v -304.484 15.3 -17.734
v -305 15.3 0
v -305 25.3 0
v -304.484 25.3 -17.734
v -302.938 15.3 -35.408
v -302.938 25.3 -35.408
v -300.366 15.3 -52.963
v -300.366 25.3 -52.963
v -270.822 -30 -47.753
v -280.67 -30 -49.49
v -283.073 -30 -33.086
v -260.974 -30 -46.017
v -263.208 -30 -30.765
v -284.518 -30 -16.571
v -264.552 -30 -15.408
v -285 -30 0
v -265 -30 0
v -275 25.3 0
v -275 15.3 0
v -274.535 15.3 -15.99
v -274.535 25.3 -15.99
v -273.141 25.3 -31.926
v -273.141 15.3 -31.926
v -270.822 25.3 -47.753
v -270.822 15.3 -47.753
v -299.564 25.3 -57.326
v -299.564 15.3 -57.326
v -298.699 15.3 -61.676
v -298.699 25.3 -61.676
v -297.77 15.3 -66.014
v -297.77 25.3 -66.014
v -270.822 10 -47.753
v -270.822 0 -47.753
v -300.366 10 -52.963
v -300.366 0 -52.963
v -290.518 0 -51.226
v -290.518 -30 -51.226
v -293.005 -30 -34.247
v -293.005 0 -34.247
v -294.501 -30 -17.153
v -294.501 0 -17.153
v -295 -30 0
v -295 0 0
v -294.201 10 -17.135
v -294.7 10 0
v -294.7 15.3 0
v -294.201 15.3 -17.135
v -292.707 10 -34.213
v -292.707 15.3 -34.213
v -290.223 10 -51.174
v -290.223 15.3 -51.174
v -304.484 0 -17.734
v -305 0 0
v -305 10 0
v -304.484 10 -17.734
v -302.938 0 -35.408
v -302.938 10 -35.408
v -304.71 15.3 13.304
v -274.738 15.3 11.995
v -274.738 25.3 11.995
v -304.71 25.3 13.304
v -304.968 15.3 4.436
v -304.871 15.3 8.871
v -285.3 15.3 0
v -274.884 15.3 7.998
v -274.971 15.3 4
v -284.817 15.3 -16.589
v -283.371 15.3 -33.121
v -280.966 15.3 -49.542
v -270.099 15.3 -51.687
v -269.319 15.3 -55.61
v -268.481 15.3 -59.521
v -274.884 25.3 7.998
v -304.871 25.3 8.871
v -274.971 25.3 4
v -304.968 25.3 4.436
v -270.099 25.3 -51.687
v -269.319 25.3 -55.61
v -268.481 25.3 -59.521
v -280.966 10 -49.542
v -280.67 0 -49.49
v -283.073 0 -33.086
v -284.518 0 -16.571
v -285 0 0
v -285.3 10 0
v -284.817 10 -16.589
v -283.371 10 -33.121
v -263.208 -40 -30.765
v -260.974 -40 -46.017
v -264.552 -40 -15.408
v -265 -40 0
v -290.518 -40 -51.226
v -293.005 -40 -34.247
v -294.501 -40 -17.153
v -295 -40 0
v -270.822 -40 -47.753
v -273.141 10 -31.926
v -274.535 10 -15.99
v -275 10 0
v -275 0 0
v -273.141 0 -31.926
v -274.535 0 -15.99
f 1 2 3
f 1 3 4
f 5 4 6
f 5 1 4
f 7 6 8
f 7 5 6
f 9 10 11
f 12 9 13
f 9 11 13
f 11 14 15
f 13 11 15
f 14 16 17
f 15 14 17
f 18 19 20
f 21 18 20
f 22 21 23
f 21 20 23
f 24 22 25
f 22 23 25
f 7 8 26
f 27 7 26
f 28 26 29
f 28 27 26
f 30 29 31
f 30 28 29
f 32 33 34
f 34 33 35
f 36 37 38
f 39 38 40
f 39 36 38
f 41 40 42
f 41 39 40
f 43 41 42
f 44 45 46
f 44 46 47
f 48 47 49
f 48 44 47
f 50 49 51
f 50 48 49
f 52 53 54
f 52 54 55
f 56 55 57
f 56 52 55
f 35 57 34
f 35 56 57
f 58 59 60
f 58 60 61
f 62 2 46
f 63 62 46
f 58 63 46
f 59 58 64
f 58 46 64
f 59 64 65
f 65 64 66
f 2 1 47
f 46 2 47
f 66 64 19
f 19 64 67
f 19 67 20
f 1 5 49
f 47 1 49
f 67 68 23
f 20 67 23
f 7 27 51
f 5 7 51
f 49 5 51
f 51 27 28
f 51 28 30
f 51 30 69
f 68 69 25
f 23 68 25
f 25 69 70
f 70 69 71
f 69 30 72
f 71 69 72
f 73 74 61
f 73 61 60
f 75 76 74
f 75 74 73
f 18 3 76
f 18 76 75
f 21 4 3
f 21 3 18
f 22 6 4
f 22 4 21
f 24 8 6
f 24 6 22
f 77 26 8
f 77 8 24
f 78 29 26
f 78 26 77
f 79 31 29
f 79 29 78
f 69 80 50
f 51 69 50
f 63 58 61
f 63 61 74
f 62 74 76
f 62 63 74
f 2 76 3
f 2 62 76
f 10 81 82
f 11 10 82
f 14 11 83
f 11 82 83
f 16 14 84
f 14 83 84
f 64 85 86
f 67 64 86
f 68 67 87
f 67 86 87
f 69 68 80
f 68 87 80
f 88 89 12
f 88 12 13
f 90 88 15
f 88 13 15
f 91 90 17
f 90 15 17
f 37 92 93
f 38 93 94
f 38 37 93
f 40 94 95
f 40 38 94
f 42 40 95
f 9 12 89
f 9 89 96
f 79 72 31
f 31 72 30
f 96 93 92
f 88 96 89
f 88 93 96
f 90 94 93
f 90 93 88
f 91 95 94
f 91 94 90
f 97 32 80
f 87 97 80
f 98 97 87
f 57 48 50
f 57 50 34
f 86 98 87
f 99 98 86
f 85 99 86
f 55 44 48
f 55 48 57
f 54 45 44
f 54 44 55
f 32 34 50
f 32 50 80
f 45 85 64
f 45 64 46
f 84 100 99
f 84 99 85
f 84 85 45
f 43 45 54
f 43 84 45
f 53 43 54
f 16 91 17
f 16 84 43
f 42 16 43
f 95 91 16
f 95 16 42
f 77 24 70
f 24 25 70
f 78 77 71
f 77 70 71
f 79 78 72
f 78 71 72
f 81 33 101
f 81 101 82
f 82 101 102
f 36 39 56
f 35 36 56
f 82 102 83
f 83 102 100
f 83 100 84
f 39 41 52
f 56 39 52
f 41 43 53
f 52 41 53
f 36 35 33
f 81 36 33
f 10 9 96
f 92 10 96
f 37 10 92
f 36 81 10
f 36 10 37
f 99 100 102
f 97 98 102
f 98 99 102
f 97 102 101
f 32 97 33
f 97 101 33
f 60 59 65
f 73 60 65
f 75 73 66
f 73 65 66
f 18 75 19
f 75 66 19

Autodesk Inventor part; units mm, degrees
ref_plane "YZ Plane" through (0, 0, 0) normal (1, 0, 0) x (0, 1, 0)
ref_plane "XZ Plane" through (0, 0, 0) normal (0, 1, 0) x (-1, 0, 0)
ref_plane "XY Plane" through (0, 0, 0) normal (0, 0, 1) x (1, 0, 0)
sketch "Sketch1" plane through (0, 0, 0) normal (0, 1, 0) x (-1, 0, 0)
  circle A0 centre (0, 0) radius 285
  circle A1 centre (0, 0) radius 295
  circle A2 centre (0, 0) radius 275
  circle A3 centre (0, 0) radius 305
  line L0 (0, 0) -> (300.3664, -52.9627)
  line L1 (0, 0) -> (305, 0)
  point P0 (275, 0)
  point P1 (270.8221, -47.7532)
  dimension "d1" = 590
  dimension "d5" = 10
  dimension "d6" = 10
  dimension "d7" = 10
  dimension "d8" = 10
extrude "Extrusion1" add sketch "Sketch1" along normal blind 10 contours L1 A1 L0 A0 | A0 L0 A2 L1 | L1 A3 L0 A1 picked at (291.5003, -5.7176) picked at (281.3509, -10.8537) picked at (297.9408, -46.5324)
sketch "Sketch2" plane through (0, 10, 0) normal (0, 1, 0) x (1, 0, 0)
  arc A0 (-270.8221, 47.7532) -> (-275, 0) centre (0, 0) ccw projected
  line L0 (-270.8221, 47.7532) -> (-300.3664, 52.9627) projected
  arc A1 (-300.3664, 52.9627) -> (-305, 0) centre (0, 0) ccw projected
  line L1 (-305, 0) -> (-275, 0) projected
  circle A2 centre (0, 0) radius 295
  circle A3 centre (0, 0) radius 285
  circle A4 centre (0, 0) radius 294.7
  circle A5 centre (0, 0) radius 285.3
  point P0 (-285, 0)
  point P1 (-280.6702, 49.4897)
  point P2 (-290.5183, 51.2262)
  point P3 (-295, 0)
  point P4 (-285.3, 0)
  point P5 (-280.9657, 49.5418)
  point P6 (-290.2228, 51.1741)
  point P7 (-294.7, 0)
  dimension "d11" = 10
  dimension "d12" = 590
  dimension "d26" = 0.3
  dimension "d27" = 0.3
extrude "Extrusion2" add sketch "Sketch2" along normal blind 5.3 contours A5 L1 A4 L0 picked at (-291.2396, 11.2413)
sketch "Sketch3" plane through (0, 15.3, 0) normal (0, 1, 0) x (1, 0, 0)
  line L0 (-290.2228, 51.1741) -> (-300.3664, 52.9627) projected
  arc A0 (-300.3664, 52.9627) -> (-305, 0) centre (0, 0) ccw projected
  line L1 (-305, 0) -> (-294.7, 0) projected
  line L2 (-280.9657, 49.5418) -> (-290.2228, 51.1741) projected
  line L3 (-294.7, 0) -> (-285.3, 0) projected
  line L4 (-285.3, 0) -> (-275, 0) projected
  arc A1 (-270.8221, 47.7532) -> (-275, 0) centre (0, 0) ccw projected
  line L5 (-270.8221, 47.7532) -> (-280.9657, 49.5418) projected
  circle A2 centre (0, 0) radius 305
  circle A3 centre (0, 0) radius 275
  line L6 (0, 0) -> (-304.7097, -13.3039)
  line L7 (0, 0) -> (-297.7703, 66.0141)
  arc A4 (-300.3664, 52.9627) -> (-305, 0) centre (0, 0) ccw projected
  arc A5 (-270.8221, 47.7532) -> (-275, 0) centre (0, 0) ccw projected
  line L8 (-290.2228, 51.1741) -> (-300.3664, 52.9627) projected
  line L9 (-305, 0) -> (-294.7, 0) projected
  line L10 (-285.3, 0) -> (-275, 0) projected
  line L11 (-270.8221, 47.7532) -> (-280.9657, 49.5418) projected
  arc A6 (-290.2228, 51.1741) -> (-294.7, 0) centre (0, 0) ccw projected
  arc A7 (-280.9657, 49.5418) -> (-285.3, 0) centre (0, 0) ccw projected
  arc A8 (-290.2228, 51.1741) -> (-294.7, 0) centre (0, 0) ccw projected
  arc A9 (-280.9657, 49.5418) -> (-285.3, 0) centre (0, 0) ccw projected
  arc A10 (-290.2228, 51.1741) -> (-294.7, 0) centre (0, 0) ccw projected
  arc A11 (-280.9657, 49.5418) -> (-285.3, 0) centre (0, 0) ccw projected
  point P0 (-270.8221, 47.7532)
  point P1 (-268.4814, 59.5209)
  point P2 (-305, 0)
  point P3 (-274.7383, -11.9953)
  point P4 (-305, 0)
  point P5 (-300.3664, 52.9627)
  point P6 (-305, 0)
  point P7 (-270.8221, 47.7532)
  dimension "d23" = 2.5
  dimension "d28" = 2.5
extrude "Extrusion3" add sketch "Sketch3" along normal blind 10 contours A6 L1 A0 L0 | L0 A2 L7 A3 L5 L2 | L2 A7 L3 A6 | L5 A1 L4 A7 | L3 L4 A3 L6 A2 L1
sketch "Sketch4" plane through (0, 0, 0) normal (0, -1, 0) x (1, 0, 0)
  arc A0 (-275, 0) -> (-270.8221, -47.7532) centre (0, 0) ccw projected
  line L0 (-305, 0) -> (-275, 0) projected
  arc A1 (-305, 0) -> (-300.3664, -52.9627) centre (0, 0) ccw projected
  line L1 (-270.8221, -47.7532) -> (-300.3664, -52.9627) projected
  circle A2 centre (0, 0) radius 285
  circle A3 centre (0, 0) radius 295
  point P0 (-295, 0)
  point P1 (-290.5183, -51.2262)
  point P2 (-280.6702, -49.4897)
  point P3 (-285, 0)
  dimension "d17" = 10
  dimension "d18" = 590
extrude "Extrusion4" add sketch "Sketch4" along normal blind 30 contours A2 L1 A3 L0 picked at (-291.3396, -11.2413)
sketch "Sketch5" plane through (0, -30, 0) normal (0, -1, 0) x (1, 0, 0)
  arc A0 (-295, 0) -> (-290.5183, -51.2262) centre (0, 0) ccw projected
  line L0 (-290.5183, -51.2262) -> (-280.6702, -49.4897) projected
  arc A1 (-285, 0) -> (-280.6702, -49.4897) centre (0, 0) ccw projected
  line L1 (-285, 0) -> (-295, 0) projected
  arc A2 (-295, 0) -> (-290.5183, -51.2262) centre (0, 0) ccw projected
  line L2 (-305, 0) -> (-295, 0) projected
  arc A3 (-305, 0) -> (-300.3664, -52.9627) centre (0, 0) ccw projected
  line L3 (-290.5183, -51.2262) -> (-300.3664, -52.9627) projected
  line L4 (-270.8221, -47.7532) -> (-280.6702, -49.4897) projected
  arc A4 (-275, 0) -> (-270.8221, -47.7532) centre (0, 0) ccw projected
  line L5 (-285, 0) -> (-275, 0) projected
  arc A5 (-305, 0) -> (-300.3664, -52.9627) centre (0, 0) ccw projected
  arc A6 (-275, 0) -> (-270.8221, -47.7532) centre (0, 0) ccw projected
  arc A7 (-285, 0) -> (-280.6702, -49.4897) centre (0, 0) ccw projected
  arc A8 (-295, 0) -> (-290.5183, -51.2262) centre (0, 0) ccw projected
  line L6 (-305, 0) -> (-295, 0) projected
  line L7 (-290.5183, -51.2262) -> (-300.3664, -52.9627) projected
  arc A9 (-285, 0) -> (-280.6702, -49.4897) centre (0, 0) ccw projected
  line L8 (-270.8221, -47.7532) -> (-280.6702, -49.4897) projected
  line L9 (-285, 0) -> (-275, 0) projected
  arc A10 (-295, 0) -> (-290.5183, -51.2262) centre (0, 0) ccw projected
  circle A11 centre (0, 0) radius 265
  line L10 (0, 0) -> (-305, 0)
  line L11 (0, 0) -> (-300.3664, -52.9627)
  point P0 (-290.5183, -51.2262)
  point P1 (-260.9741, -46.0168)
  point P2 (-265, 0)
  dimension "d25" = 30
extrude "Extrusion5" add sketch "Sketch5" along normal blind 10 contours L1 A1 L0 A0 | L5 A4 L4 A1 | L10 A11 L11 A4
equation "\"d27\" = d26"
equation "\"d28\" = d23"
properties part number "Moving Caoursel base Clip" material "PLA Plastic"
